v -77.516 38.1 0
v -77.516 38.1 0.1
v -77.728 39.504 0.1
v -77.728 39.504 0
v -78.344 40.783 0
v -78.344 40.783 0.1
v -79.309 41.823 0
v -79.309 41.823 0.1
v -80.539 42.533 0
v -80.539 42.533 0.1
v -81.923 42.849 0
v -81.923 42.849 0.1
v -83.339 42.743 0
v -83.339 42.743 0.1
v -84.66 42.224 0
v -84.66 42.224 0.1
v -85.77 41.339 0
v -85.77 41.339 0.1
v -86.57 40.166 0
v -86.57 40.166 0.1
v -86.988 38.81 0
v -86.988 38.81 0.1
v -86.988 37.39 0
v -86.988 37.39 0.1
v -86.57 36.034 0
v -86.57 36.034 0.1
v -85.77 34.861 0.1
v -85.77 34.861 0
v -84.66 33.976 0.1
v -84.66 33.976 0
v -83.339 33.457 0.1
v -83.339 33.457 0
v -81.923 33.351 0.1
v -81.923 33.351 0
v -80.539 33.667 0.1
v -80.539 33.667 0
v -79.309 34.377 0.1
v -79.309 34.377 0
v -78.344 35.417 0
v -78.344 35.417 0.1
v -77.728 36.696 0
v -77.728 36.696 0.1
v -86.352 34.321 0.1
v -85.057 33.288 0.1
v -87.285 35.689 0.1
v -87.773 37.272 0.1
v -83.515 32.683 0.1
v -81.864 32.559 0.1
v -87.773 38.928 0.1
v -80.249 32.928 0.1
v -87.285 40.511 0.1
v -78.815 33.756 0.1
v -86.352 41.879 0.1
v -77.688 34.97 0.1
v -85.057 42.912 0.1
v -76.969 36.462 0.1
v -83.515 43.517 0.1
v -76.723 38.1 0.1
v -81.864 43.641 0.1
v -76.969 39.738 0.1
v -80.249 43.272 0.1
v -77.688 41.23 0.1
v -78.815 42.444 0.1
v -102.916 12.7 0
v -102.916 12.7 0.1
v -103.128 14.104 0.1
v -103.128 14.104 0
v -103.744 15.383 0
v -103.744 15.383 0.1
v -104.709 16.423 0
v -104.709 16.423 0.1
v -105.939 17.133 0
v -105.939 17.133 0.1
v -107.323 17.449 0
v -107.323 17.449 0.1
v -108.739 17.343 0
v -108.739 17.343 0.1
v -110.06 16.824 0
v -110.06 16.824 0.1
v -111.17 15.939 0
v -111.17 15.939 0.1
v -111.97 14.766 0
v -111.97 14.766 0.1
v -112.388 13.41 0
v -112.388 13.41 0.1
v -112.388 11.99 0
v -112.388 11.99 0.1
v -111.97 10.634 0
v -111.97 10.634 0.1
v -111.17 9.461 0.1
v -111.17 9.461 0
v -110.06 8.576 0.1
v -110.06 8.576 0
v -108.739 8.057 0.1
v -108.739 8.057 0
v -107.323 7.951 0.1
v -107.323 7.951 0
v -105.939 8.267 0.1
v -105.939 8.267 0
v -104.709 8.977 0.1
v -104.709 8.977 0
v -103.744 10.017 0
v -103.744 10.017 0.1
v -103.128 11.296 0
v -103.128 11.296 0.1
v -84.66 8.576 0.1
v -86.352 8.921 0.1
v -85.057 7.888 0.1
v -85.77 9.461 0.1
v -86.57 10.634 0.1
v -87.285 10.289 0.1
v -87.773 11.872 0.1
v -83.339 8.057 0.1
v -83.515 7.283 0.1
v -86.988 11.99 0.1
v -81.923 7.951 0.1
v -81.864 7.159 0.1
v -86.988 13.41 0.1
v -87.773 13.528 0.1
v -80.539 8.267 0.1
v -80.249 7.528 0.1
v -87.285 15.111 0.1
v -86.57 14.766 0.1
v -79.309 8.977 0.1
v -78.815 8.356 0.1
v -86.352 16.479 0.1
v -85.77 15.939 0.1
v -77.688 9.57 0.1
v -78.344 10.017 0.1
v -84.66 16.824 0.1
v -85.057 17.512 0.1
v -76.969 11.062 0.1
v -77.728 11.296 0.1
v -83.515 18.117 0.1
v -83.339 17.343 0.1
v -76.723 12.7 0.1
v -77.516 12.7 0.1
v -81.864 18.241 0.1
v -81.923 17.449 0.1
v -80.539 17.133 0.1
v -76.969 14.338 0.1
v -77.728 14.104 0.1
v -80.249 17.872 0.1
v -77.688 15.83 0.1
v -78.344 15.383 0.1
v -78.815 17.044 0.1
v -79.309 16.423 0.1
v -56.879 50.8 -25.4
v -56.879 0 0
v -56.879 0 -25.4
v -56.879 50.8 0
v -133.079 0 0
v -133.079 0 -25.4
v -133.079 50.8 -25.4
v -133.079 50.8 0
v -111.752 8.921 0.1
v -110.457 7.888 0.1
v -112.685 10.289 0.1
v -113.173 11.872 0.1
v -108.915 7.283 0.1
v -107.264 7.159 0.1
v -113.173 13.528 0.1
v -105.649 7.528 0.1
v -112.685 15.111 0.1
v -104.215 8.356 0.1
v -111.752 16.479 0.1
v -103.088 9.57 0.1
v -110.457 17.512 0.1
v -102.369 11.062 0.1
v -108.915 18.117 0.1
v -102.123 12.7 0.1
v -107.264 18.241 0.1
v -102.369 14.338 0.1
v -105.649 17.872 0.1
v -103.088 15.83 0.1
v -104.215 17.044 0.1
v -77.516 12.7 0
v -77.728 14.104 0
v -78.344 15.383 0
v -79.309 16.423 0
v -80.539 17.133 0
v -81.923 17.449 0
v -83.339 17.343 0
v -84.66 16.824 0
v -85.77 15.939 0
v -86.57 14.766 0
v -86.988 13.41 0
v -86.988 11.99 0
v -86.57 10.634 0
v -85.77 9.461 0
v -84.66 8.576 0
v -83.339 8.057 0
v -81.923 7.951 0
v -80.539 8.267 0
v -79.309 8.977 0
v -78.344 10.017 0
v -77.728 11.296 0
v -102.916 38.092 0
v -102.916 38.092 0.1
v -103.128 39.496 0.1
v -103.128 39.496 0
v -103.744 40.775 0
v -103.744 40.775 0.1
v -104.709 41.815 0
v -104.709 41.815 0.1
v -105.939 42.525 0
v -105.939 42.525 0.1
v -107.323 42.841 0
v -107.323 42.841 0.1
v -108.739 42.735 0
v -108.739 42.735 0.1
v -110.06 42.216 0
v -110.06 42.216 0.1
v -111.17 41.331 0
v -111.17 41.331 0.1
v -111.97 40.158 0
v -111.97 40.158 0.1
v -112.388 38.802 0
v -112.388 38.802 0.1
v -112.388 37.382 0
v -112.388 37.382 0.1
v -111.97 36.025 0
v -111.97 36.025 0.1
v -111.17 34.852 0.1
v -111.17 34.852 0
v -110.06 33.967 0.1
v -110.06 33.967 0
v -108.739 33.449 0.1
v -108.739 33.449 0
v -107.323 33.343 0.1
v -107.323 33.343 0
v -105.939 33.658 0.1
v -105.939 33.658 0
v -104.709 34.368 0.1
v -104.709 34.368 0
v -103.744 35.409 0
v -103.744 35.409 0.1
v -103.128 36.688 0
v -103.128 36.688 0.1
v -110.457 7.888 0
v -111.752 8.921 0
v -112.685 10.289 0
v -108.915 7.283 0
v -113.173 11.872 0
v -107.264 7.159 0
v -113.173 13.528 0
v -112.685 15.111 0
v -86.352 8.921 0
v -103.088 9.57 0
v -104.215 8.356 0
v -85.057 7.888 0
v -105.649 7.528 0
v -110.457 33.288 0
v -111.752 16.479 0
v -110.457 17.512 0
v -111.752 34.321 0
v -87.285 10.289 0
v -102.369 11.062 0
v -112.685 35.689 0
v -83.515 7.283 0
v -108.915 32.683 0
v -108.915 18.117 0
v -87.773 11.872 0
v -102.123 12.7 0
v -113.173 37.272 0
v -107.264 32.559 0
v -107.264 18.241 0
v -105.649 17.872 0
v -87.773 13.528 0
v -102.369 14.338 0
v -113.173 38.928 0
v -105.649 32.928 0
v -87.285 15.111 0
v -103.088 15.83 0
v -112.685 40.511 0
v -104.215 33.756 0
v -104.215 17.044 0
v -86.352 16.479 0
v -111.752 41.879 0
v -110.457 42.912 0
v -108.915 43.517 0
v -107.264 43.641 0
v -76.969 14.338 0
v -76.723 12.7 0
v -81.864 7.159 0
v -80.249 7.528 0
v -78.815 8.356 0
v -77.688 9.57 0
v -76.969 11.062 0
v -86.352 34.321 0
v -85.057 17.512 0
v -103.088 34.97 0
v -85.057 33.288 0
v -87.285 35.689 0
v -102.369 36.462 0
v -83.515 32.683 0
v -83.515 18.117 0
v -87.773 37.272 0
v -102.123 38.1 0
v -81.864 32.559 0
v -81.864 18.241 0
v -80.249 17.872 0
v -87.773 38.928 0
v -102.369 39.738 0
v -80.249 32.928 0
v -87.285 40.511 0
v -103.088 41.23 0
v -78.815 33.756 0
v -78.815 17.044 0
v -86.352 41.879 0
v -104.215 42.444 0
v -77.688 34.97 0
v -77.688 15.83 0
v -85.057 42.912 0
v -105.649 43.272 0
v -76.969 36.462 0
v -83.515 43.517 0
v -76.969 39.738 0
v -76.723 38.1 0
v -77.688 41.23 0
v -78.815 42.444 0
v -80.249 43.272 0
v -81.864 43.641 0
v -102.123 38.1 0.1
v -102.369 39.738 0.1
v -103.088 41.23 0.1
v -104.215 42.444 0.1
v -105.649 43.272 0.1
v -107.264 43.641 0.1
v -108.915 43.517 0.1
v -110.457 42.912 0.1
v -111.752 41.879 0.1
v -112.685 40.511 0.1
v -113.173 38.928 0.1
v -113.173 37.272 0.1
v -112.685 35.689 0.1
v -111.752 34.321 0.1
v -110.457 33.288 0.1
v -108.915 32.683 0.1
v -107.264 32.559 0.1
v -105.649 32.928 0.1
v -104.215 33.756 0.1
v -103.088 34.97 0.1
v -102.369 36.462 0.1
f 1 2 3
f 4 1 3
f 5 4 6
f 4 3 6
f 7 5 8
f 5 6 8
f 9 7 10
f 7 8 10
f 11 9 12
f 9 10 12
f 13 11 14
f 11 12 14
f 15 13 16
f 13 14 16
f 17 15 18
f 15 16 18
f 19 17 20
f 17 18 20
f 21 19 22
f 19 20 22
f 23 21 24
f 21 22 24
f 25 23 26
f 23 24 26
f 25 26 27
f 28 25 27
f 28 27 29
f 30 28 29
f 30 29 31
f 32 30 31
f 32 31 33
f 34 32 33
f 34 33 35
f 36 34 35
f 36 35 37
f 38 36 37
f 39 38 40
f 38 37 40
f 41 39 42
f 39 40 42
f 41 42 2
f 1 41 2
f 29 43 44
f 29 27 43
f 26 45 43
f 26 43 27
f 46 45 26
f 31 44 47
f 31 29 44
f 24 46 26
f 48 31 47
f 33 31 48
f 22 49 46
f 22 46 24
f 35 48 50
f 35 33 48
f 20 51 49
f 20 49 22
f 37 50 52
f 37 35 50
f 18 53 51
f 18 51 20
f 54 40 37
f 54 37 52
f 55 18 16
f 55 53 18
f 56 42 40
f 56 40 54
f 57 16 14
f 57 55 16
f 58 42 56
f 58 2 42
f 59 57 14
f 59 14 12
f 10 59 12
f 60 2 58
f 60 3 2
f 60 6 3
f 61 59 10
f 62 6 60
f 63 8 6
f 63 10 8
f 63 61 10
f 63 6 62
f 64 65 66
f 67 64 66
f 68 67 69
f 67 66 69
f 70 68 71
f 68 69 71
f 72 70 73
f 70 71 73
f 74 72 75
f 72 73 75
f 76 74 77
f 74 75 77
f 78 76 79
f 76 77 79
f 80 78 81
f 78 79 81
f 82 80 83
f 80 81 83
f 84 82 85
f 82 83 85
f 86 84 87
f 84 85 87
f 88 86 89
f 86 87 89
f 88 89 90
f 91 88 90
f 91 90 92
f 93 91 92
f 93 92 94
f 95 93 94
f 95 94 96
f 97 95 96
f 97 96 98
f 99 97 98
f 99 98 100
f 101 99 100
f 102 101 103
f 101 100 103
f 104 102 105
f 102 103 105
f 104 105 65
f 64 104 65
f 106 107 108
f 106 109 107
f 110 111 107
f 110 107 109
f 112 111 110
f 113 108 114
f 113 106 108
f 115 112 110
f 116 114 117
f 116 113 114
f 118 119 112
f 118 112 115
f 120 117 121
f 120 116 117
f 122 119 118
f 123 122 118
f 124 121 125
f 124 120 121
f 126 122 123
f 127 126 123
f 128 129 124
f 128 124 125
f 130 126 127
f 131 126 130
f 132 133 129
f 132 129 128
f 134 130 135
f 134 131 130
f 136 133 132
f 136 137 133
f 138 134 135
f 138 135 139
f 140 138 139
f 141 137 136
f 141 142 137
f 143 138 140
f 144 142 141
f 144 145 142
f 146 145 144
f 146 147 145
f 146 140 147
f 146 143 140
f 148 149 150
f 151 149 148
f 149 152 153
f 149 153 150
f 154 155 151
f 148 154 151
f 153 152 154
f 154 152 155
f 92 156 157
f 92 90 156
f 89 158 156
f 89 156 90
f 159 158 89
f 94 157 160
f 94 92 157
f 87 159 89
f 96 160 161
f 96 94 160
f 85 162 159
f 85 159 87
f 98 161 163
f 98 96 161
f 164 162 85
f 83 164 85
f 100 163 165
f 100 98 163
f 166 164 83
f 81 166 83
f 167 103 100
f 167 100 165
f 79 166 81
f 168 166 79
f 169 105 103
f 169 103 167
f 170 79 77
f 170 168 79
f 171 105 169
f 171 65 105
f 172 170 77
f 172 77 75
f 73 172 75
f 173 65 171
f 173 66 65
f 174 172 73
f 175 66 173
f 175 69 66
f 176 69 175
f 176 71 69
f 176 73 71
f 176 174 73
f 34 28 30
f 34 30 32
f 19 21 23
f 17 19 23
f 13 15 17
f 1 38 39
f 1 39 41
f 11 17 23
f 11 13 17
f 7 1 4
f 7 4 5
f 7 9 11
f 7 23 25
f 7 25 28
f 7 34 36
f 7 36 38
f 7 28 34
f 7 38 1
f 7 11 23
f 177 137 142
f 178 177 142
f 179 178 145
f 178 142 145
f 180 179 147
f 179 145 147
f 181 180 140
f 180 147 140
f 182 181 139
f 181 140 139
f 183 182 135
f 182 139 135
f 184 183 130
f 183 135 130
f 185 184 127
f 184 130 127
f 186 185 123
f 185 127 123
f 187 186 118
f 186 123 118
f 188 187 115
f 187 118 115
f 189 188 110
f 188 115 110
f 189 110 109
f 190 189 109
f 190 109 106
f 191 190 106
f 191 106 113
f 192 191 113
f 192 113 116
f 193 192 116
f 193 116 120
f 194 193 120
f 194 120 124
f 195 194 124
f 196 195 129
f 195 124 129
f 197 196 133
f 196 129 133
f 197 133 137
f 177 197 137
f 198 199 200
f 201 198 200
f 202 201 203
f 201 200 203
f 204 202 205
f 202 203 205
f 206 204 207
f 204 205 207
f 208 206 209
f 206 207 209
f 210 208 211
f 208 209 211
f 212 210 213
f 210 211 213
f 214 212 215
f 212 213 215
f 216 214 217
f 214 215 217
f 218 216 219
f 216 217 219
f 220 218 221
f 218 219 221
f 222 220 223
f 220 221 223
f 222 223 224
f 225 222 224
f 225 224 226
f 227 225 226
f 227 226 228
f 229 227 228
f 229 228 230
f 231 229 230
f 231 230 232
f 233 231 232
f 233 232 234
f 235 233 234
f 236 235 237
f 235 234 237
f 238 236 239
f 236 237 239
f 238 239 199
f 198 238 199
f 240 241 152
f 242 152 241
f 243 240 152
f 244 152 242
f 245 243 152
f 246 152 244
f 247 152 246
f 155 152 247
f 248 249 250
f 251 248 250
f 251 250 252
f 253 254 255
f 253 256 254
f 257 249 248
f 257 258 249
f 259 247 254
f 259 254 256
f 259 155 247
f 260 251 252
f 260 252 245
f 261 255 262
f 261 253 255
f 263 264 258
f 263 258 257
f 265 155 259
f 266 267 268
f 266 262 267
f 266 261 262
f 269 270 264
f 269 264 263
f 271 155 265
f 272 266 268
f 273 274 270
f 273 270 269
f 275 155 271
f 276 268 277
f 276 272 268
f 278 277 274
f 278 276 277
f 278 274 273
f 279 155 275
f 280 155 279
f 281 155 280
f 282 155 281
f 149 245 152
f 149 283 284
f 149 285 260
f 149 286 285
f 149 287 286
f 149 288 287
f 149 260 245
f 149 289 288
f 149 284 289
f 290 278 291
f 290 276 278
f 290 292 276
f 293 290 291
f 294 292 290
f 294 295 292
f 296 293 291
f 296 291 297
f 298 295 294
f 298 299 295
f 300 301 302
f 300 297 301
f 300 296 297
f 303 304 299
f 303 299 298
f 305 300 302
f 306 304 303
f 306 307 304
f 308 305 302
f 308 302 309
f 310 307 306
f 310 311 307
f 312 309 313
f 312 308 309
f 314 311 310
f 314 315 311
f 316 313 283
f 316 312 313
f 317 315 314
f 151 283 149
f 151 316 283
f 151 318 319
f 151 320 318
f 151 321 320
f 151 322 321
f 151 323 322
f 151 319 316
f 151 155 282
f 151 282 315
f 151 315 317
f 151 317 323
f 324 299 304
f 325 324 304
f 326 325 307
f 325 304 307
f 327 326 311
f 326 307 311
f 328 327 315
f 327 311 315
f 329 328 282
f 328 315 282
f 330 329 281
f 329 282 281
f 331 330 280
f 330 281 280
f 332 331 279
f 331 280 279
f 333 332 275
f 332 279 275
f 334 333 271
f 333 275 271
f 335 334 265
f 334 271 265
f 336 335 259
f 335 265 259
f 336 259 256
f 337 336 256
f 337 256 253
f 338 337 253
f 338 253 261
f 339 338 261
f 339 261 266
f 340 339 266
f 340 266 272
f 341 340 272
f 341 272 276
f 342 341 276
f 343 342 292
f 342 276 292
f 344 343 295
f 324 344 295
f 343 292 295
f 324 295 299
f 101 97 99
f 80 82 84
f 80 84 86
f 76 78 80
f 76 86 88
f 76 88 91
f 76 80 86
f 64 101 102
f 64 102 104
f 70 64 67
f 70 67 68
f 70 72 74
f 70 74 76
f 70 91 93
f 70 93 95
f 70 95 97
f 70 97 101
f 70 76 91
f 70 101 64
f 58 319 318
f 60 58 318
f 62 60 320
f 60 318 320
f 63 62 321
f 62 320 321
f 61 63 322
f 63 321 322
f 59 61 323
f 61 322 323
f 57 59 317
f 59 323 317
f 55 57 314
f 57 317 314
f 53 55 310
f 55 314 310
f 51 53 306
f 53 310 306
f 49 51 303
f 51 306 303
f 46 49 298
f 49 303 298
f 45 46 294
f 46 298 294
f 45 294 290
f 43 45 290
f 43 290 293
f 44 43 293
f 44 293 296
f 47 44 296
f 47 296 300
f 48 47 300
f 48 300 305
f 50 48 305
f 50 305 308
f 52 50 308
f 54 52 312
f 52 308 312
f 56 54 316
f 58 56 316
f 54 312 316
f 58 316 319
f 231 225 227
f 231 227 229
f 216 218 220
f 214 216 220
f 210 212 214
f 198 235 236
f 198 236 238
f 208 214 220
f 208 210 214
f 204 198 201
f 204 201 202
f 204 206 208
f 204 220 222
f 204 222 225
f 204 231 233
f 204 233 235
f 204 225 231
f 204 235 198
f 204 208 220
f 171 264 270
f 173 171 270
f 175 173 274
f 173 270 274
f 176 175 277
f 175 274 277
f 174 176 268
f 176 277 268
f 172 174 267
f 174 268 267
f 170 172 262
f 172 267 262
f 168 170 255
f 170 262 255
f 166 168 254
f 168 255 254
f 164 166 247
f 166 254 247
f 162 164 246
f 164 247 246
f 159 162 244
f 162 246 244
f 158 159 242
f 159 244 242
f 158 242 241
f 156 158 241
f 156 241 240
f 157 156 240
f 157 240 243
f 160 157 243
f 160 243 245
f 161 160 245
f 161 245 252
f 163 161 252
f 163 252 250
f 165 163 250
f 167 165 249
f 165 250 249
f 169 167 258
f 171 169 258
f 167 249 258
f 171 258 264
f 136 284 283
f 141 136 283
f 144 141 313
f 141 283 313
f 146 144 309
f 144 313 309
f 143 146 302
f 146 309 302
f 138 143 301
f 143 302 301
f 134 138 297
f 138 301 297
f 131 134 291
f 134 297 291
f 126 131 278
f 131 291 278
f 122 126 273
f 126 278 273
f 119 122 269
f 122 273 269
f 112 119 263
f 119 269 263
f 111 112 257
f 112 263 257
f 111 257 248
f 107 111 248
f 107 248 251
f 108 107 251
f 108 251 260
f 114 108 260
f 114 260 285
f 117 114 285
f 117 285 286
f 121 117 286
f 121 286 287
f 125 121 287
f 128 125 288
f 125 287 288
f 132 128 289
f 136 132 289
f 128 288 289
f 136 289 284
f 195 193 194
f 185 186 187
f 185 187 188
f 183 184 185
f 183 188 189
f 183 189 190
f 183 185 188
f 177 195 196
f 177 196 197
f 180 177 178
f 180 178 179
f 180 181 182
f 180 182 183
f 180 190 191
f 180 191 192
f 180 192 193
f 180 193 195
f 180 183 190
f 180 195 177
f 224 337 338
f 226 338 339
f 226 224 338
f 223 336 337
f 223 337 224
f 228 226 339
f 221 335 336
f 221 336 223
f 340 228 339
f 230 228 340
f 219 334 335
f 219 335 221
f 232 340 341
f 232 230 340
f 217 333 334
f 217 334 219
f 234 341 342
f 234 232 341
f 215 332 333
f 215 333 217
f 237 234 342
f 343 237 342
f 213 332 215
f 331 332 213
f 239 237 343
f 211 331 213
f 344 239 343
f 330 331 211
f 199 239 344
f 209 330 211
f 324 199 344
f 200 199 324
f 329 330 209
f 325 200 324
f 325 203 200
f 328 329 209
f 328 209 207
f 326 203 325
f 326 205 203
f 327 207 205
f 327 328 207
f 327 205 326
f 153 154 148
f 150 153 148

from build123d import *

# Parameters (mm, degrees)
F0_W     = 76.2
F0_H     = 50.8
F1_DEPTH = 25.4
F2_R     = 5.55625
F3_DEPTH = 0.1
F4_R     = 4.7625
F5_DEPTH = 0.1


with BuildPart() as f1:
    # F0 (on Top) → F1 (new body)
    with BuildSketch(Plane.XY):
        with Locations((-94.978769, 25.4)):
            Rectangle(F0_W, F0_H)
    extrude(amount=-F1_DEPTH)

    # F2 (on face) → F3 (join)
    with BuildSketch(Plane.XY):
        with Locations((-107.678769, 38.1)):
            Circle(F2_R)
        with Locations((-82.278769, 38.1)):
            Circle(F2_R)
        with Locations((-107.678769, 12.7)):
            Circle(F2_R)
        with Locations((-82.278769, 12.7)):
            Circle(F2_R)
    extrude(amount=F3_DEPTH)

    # F4 (on face) → F5 (cut)
    with BuildSketch(Plane.XY.offset(0.1)):
        with Locations((-107.678769, 38.091734)):
            Circle(F4_R)
        with Locations((-82.278769, 38.1)):
            Circle(F4_R)
        with Locations((-107.678769, 12.7)):
            Circle(F4_R)
        with Locations((-82.278769, 12.7)):
            Circle(F4_R)
    extrude(amount=-F5_DEPTH, mode=Mode.SUBTRACT)


solid = f1.part
